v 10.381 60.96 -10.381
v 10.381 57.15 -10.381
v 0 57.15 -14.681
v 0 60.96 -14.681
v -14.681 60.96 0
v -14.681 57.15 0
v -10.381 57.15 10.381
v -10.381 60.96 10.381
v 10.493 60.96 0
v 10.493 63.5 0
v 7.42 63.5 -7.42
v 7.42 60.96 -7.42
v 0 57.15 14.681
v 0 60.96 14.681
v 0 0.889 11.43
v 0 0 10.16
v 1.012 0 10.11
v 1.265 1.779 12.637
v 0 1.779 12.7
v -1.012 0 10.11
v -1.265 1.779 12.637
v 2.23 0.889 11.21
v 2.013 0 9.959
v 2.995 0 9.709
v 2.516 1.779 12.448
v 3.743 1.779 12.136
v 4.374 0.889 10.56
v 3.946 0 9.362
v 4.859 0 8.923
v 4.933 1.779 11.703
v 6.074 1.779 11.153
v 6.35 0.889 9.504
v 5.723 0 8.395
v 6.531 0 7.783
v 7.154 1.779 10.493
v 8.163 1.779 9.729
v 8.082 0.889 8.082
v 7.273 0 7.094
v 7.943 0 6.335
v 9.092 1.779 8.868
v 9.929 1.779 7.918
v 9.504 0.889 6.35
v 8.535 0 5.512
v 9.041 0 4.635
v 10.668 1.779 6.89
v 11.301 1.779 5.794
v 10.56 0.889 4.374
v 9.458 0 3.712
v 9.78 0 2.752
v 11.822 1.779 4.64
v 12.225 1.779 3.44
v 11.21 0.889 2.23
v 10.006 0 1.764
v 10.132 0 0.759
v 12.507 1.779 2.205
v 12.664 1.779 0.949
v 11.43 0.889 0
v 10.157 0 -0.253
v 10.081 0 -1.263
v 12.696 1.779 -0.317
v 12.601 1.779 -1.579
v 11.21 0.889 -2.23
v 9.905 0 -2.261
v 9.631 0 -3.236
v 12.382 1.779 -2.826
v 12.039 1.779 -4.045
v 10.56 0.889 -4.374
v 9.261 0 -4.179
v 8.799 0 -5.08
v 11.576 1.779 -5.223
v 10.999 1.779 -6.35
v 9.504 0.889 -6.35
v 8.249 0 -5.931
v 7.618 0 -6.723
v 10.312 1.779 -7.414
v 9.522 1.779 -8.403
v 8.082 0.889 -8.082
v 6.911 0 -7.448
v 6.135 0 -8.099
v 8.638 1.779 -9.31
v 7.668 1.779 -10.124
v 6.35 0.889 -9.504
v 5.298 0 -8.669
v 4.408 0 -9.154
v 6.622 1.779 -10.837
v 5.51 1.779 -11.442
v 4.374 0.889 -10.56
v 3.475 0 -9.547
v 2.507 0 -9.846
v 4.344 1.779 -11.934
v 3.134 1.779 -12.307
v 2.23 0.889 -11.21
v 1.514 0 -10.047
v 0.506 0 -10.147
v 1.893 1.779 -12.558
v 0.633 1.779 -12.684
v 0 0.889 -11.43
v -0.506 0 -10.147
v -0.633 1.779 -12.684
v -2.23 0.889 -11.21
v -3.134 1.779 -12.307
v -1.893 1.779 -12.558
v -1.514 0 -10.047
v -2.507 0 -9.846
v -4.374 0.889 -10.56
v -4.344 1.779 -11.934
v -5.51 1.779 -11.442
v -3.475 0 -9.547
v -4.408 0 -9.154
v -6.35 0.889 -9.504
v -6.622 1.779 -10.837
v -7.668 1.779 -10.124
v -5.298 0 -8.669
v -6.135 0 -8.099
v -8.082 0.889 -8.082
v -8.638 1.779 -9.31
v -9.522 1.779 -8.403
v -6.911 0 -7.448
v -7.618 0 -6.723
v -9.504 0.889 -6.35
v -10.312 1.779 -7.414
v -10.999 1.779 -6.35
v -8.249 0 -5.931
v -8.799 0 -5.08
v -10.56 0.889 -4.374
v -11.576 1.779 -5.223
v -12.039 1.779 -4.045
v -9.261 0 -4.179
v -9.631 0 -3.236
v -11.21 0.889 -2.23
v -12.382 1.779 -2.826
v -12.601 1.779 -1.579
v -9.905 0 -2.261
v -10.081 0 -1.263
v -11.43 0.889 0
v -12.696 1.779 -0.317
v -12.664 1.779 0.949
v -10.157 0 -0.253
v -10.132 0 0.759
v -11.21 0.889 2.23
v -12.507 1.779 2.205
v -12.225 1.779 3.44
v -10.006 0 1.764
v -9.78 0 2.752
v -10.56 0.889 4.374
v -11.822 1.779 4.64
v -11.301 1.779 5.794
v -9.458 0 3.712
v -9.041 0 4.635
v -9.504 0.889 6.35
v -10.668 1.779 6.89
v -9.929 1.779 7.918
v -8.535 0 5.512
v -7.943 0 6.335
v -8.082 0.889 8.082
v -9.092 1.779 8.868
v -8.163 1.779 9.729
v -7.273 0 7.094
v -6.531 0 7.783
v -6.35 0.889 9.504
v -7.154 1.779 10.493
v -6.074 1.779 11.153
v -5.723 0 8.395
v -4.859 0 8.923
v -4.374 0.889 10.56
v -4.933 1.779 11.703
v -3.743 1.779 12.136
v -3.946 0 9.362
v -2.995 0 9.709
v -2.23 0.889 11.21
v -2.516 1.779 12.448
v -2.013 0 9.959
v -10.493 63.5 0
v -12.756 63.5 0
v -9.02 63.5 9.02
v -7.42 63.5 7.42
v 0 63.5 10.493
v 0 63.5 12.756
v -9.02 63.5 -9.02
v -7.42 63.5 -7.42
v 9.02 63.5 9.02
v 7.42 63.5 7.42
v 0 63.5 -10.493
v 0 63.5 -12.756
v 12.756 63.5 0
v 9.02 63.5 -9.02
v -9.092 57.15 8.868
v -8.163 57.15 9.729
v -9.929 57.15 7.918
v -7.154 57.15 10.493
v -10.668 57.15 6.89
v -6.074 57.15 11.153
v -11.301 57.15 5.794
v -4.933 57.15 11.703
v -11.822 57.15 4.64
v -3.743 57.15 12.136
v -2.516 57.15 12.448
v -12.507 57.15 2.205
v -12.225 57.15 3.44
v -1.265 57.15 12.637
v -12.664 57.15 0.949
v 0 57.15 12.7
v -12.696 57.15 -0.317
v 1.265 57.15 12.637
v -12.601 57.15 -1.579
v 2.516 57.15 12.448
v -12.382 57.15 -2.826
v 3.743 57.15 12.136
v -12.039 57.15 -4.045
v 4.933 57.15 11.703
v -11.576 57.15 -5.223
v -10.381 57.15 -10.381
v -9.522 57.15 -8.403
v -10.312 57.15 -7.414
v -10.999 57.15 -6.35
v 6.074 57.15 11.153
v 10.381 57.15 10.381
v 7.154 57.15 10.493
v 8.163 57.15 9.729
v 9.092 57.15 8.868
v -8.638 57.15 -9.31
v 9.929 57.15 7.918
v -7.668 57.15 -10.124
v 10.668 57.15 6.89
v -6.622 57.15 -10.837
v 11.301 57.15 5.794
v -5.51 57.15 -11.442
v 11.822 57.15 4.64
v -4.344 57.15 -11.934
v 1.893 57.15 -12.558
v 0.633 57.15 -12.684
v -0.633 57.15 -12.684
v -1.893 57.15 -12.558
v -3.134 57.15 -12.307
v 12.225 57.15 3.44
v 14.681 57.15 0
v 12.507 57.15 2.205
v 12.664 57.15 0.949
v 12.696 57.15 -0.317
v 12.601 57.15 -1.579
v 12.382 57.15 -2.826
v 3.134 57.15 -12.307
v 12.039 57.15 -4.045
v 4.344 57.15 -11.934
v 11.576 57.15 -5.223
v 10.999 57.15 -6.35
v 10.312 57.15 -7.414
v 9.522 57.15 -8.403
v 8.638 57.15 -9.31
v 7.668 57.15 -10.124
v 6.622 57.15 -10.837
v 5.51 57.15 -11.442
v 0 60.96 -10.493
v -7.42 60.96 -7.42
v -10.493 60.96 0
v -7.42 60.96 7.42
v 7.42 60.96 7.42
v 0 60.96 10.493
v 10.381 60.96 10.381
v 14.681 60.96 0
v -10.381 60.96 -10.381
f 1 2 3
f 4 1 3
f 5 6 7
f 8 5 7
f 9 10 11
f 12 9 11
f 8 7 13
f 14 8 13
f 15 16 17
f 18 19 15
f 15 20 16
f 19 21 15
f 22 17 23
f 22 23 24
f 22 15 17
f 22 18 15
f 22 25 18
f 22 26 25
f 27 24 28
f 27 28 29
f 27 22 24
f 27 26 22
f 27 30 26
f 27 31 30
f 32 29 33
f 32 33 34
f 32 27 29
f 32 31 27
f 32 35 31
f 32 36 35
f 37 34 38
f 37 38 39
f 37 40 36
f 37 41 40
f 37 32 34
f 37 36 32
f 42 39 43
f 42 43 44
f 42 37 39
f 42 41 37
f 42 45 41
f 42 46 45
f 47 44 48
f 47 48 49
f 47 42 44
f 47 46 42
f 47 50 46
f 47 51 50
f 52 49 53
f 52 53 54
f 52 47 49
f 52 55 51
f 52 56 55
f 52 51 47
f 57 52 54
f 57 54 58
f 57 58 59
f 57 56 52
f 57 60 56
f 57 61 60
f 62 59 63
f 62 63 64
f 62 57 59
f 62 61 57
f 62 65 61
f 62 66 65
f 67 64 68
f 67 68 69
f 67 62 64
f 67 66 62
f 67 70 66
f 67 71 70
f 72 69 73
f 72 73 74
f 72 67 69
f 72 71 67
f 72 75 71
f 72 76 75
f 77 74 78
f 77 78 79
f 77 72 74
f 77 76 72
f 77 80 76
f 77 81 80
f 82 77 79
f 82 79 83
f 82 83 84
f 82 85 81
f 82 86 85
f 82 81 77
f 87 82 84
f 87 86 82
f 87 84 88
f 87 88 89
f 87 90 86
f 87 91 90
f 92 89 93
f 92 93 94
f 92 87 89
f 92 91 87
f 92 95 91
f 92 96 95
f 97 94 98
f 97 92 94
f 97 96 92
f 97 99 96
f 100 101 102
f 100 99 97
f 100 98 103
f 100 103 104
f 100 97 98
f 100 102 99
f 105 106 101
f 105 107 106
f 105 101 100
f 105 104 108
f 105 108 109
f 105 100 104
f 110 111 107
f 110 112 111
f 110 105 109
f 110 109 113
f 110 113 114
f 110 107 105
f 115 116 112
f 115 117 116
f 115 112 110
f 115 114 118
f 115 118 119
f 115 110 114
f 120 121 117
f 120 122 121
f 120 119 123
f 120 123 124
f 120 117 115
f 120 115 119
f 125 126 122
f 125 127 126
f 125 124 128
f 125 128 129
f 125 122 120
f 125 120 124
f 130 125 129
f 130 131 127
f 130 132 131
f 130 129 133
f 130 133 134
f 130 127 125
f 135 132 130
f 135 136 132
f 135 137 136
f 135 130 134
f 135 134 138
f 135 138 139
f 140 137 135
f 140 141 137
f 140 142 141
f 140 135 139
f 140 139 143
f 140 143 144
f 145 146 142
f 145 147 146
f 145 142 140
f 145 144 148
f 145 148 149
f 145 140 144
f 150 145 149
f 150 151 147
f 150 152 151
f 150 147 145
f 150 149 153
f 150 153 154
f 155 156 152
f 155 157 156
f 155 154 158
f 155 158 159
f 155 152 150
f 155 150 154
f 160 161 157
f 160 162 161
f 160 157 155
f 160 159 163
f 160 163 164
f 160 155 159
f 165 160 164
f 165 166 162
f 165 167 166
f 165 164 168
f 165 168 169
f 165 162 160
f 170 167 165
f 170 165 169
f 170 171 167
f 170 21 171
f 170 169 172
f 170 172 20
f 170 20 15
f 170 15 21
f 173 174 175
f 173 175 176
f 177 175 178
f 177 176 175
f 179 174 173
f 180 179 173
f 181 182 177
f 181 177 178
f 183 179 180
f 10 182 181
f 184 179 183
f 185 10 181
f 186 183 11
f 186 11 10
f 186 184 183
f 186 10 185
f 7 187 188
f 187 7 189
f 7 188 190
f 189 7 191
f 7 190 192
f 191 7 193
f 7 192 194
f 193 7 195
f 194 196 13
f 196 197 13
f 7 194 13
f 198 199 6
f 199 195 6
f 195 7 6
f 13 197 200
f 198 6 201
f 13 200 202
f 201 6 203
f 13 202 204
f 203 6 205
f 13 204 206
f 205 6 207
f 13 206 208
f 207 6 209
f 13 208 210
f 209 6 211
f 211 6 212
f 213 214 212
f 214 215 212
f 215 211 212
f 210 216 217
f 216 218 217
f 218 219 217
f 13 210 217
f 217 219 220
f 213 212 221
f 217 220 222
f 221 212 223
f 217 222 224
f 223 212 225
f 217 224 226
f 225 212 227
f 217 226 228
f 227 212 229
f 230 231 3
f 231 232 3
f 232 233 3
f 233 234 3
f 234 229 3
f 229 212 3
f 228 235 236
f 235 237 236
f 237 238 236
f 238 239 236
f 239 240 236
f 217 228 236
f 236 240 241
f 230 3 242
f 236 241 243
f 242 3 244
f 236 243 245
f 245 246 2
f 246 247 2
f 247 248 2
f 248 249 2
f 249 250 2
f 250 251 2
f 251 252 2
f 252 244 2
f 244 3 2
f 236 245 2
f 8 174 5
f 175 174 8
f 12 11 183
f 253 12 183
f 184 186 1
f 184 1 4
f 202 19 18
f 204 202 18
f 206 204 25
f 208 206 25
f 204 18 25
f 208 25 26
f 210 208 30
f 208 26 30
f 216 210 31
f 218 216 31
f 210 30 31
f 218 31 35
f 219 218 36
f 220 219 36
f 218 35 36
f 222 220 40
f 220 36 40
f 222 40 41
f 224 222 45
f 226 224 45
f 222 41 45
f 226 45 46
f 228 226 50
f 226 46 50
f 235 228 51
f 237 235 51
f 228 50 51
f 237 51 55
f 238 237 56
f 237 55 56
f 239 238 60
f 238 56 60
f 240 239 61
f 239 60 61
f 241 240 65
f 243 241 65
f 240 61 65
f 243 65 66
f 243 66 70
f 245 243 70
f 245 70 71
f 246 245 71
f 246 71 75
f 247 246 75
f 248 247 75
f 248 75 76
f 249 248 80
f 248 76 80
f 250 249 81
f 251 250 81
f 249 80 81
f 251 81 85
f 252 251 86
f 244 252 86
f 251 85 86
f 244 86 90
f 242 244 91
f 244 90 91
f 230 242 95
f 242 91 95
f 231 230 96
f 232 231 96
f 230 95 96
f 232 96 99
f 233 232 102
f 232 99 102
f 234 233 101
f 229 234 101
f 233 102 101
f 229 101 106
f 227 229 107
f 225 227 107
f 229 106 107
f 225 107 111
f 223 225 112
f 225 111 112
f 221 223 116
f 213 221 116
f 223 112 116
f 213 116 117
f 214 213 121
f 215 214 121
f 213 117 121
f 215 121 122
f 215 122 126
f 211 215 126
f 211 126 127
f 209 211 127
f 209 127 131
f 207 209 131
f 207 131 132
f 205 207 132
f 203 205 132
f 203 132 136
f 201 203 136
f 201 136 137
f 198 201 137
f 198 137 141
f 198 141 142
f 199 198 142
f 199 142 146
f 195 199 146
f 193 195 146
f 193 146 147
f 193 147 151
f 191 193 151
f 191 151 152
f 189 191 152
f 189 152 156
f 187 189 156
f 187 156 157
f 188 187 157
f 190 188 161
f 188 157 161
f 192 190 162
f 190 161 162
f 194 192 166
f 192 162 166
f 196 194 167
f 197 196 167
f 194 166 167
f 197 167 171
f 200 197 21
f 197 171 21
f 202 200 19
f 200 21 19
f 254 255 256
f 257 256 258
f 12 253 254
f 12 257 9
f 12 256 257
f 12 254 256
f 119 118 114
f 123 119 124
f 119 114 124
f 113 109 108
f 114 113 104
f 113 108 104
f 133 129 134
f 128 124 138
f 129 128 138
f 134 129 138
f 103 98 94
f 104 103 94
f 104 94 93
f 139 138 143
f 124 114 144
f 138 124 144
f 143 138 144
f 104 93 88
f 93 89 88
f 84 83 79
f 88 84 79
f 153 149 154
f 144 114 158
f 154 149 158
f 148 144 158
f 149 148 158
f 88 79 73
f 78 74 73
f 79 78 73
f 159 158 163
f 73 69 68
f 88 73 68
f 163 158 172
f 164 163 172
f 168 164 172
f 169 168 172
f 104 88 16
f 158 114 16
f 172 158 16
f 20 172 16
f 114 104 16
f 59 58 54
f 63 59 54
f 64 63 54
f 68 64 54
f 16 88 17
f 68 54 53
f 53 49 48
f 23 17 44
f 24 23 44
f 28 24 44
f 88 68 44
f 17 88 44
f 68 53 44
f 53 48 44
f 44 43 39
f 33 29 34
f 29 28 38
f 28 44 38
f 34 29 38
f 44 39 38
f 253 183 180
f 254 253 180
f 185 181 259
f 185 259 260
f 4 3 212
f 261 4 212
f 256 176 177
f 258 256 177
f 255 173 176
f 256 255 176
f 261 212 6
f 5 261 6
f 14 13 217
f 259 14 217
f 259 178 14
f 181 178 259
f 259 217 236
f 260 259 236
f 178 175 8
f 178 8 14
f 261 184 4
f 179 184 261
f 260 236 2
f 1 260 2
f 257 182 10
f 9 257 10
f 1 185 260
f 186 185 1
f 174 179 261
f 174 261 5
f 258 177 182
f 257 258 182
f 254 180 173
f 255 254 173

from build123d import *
from OCP.BRepFilletAPI import BRepFilletAPI_MakeChamfer

# Parameters (mm, degrees)
SKETCH1_R           = 12.7
BOSS_EXTRUDE1_DEPTH = 57.15
BOSS_EXTRUDE2_DEPTH = 6.35
CHAMFER1_SIZE       = 2.54
CHAMFER1_SIZE2      = 1.778527147
CUT_EXTRUDE1_DEPTH  = 2.54
CHAMFER2_SIZE       = 2.54
CHAMFER2_SIZE2      = 1.778527147


with BuildPart() as part:
    # Sketch1 → Boss-Extrude1 (new body)
    with BuildSketch(Plane(origin=(0, 0, 0), x_dir=(1, 0, 0), z_dir=(0, 1, 0))):
        with Locations(Location((0, 0, 0), (0, 0, 270))):
            Circle(SKETCH1_R)
    extrude(amount=BOSS_EXTRUDE1_DEPTH)

    # Sketch2 → Boss-Extrude2 (add)
    with BuildSketch(Plane(origin=(0, 57.15, 0), x_dir=(1, 0, 0), z_dir=(0, 1, 0))):
        Polygon((0, 14.681421742), (-10.381332871, 10.381332871), (-14.681421742, 0), (-10.381332871, -10.381332871), (0, -14.681421742), (10.381332871, -10.381332871), (14.681421742, 0), (10.381332871, 10.381332871), align=None)
    extrude(amount=BOSS_EXTRUDE2_DEPTH)

    # Chamfer1: one chamfer whose edges measure the first distance from different faces: ONE call of the kernel's chamfer builder (chamfer() names one face for all edges)
    chamfer1_edges_1 = [part.edges().sort_by_distance(p)[0] for p in [
        (5.190666436, 63.5, 12.531377306),
    ]]
    chamfer1_side_1 = [part.faces().sort_by_distance(p)[0] for p in [
        (5.190666436, 60.325, 12.531377306),
    ]]
    chamfer1_edges_2 = [part.edges().sort_by_distance(p)[0] for p in [
        (12.531377306, 63.5, 5.190666436),
    ]]
    chamfer1_side_2 = [part.faces().sort_by_distance(p)[0] for p in [
        (12.531377306, 60.325, 5.190666436),
    ]]
    chamfer1_edges_3 = [part.edges().sort_by_distance(p)[0] for p in [
        (12.531377306, 63.5, -5.190666436),
    ]]
    chamfer1_side_3 = [part.faces().sort_by_distance(p)[0] for p in [
        (12.531377306, 60.325, -5.190666436),
    ]]
    chamfer1_edges_4 = [part.edges().sort_by_distance(p)[0] for p in [
        (5.190666436, 63.5, -12.531377306),
    ]]
    chamfer1_side_4 = [part.faces().sort_by_distance(p)[0] for p in [
        (5.190666436, 60.325, -12.531377306),
    ]]
    chamfer1_edges_5 = [part.edges().sort_by_distance(p)[0] for p in [
        (-5.190666436, 63.5, -12.531377306),
    ]]
    chamfer1_side_5 = [part.faces().sort_by_distance(p)[0] for p in [
        (-5.190666436, 60.325, -12.531377306),
    ]]
    chamfer1_edges_6 = [part.edges().sort_by_distance(p)[0] for p in [
        (-12.531377306, 63.5, -5.190666436),
    ]]
    chamfer1_side_6 = [part.faces().sort_by_distance(p)[0] for p in [
        (-12.531377306, 60.325, -5.190666436),
    ]]
    chamfer1_edges_7 = [part.edges().sort_by_distance(p)[0] for p in [
        (-12.531377306, 63.5, 5.190666436),
    ]]
    chamfer1_side_7 = [part.faces().sort_by_distance(p)[0] for p in [
        (-12.531377306, 60.325, 5.190666436),
    ]]
    chamfer1_edges_8 = [part.edges().sort_by_distance(p)[0] for p in [
        (-5.190666436, 63.5, 12.531377306),
    ]]
    chamfer1_side_8 = [part.faces().sort_by_distance(p)[0] for p in [
        (-5.190666436, 60.325, 12.531377306),
    ]]
    chamfer1 = BRepFilletAPI_MakeChamfer(part.part.solid().wrapped)
    for e in chamfer1_edges_1:
        chamfer1.Add(CHAMFER1_SIZE, CHAMFER1_SIZE2, e.wrapped, chamfer1_side_1[0].wrapped)  # the first distance lies on this face
    for e in chamfer1_edges_2:
        chamfer1.Add(CHAMFER1_SIZE, CHAMFER1_SIZE2, e.wrapped, chamfer1_side_2[0].wrapped)  # the first distance lies on this face
    for e in chamfer1_edges_3:
        chamfer1.Add(CHAMFER1_SIZE, CHAMFER1_SIZE2, e.wrapped, chamfer1_side_3[0].wrapped)  # the first distance lies on this face
    for e in chamfer1_edges_4:
        chamfer1.Add(CHAMFER1_SIZE, CHAMFER1_SIZE2, e.wrapped, chamfer1_side_4[0].wrapped)  # the first distance lies on this face
    for e in chamfer1_edges_5:
        chamfer1.Add(CHAMFER1_SIZE, CHAMFER1_SIZE2, e.wrapped, chamfer1_side_5[0].wrapped)  # the first distance lies on this face
    for e in chamfer1_edges_6:
        chamfer1.Add(CHAMFER1_SIZE, CHAMFER1_SIZE2, e.wrapped, chamfer1_side_6[0].wrapped)  # the first distance lies on this face
    for e in chamfer1_edges_7:
        chamfer1.Add(CHAMFER1_SIZE, CHAMFER1_SIZE2, e.wrapped, chamfer1_side_7[0].wrapped)  # the first distance lies on this face
    for e in chamfer1_edges_8:
        chamfer1.Add(CHAMFER1_SIZE, CHAMFER1_SIZE2, e.wrapped, chamfer1_side_8[0].wrapped)  # the first distance lies on this face
    add(Compound.cast(chamfer1.Shape()), mode=Mode.REPLACE)

    # Sketch3 → Cut-Extrude1 (cut)
    with BuildSketch(Plane(origin=(0, 63.5, 0), x_dir=(1, 0, 0), z_dir=(0, 1, 0))):
        Polygon((0, 10.493107574), (-7.419747521, 7.419747521), (-10.493107574, 0), (-7.419747521, -7.419747521), (0, -10.493107574), (7.419747521, -7.419747521), (10.493107574, 0), (7.419747521, 7.419747521), align=None)
    extrude(amount=-CUT_EXTRUDE1_DEPTH, mode=Mode.SUBTRACT)

    # Chamfer2
    chamfer2_edges = [part.edges().sort_by_distance(p)[0] for p in [
        (0, 0, -12.7),
    ]]
    chamfer2_side = [part.faces().sort_by_distance(p)[0] for p in [
        (0, 0, 0),
    ]]
    chamfer(chamfer2_edges, length=CHAMFER2_SIZE, length2=CHAMFER2_SIZE2, reference=chamfer2_side[0])


solid = part.part
